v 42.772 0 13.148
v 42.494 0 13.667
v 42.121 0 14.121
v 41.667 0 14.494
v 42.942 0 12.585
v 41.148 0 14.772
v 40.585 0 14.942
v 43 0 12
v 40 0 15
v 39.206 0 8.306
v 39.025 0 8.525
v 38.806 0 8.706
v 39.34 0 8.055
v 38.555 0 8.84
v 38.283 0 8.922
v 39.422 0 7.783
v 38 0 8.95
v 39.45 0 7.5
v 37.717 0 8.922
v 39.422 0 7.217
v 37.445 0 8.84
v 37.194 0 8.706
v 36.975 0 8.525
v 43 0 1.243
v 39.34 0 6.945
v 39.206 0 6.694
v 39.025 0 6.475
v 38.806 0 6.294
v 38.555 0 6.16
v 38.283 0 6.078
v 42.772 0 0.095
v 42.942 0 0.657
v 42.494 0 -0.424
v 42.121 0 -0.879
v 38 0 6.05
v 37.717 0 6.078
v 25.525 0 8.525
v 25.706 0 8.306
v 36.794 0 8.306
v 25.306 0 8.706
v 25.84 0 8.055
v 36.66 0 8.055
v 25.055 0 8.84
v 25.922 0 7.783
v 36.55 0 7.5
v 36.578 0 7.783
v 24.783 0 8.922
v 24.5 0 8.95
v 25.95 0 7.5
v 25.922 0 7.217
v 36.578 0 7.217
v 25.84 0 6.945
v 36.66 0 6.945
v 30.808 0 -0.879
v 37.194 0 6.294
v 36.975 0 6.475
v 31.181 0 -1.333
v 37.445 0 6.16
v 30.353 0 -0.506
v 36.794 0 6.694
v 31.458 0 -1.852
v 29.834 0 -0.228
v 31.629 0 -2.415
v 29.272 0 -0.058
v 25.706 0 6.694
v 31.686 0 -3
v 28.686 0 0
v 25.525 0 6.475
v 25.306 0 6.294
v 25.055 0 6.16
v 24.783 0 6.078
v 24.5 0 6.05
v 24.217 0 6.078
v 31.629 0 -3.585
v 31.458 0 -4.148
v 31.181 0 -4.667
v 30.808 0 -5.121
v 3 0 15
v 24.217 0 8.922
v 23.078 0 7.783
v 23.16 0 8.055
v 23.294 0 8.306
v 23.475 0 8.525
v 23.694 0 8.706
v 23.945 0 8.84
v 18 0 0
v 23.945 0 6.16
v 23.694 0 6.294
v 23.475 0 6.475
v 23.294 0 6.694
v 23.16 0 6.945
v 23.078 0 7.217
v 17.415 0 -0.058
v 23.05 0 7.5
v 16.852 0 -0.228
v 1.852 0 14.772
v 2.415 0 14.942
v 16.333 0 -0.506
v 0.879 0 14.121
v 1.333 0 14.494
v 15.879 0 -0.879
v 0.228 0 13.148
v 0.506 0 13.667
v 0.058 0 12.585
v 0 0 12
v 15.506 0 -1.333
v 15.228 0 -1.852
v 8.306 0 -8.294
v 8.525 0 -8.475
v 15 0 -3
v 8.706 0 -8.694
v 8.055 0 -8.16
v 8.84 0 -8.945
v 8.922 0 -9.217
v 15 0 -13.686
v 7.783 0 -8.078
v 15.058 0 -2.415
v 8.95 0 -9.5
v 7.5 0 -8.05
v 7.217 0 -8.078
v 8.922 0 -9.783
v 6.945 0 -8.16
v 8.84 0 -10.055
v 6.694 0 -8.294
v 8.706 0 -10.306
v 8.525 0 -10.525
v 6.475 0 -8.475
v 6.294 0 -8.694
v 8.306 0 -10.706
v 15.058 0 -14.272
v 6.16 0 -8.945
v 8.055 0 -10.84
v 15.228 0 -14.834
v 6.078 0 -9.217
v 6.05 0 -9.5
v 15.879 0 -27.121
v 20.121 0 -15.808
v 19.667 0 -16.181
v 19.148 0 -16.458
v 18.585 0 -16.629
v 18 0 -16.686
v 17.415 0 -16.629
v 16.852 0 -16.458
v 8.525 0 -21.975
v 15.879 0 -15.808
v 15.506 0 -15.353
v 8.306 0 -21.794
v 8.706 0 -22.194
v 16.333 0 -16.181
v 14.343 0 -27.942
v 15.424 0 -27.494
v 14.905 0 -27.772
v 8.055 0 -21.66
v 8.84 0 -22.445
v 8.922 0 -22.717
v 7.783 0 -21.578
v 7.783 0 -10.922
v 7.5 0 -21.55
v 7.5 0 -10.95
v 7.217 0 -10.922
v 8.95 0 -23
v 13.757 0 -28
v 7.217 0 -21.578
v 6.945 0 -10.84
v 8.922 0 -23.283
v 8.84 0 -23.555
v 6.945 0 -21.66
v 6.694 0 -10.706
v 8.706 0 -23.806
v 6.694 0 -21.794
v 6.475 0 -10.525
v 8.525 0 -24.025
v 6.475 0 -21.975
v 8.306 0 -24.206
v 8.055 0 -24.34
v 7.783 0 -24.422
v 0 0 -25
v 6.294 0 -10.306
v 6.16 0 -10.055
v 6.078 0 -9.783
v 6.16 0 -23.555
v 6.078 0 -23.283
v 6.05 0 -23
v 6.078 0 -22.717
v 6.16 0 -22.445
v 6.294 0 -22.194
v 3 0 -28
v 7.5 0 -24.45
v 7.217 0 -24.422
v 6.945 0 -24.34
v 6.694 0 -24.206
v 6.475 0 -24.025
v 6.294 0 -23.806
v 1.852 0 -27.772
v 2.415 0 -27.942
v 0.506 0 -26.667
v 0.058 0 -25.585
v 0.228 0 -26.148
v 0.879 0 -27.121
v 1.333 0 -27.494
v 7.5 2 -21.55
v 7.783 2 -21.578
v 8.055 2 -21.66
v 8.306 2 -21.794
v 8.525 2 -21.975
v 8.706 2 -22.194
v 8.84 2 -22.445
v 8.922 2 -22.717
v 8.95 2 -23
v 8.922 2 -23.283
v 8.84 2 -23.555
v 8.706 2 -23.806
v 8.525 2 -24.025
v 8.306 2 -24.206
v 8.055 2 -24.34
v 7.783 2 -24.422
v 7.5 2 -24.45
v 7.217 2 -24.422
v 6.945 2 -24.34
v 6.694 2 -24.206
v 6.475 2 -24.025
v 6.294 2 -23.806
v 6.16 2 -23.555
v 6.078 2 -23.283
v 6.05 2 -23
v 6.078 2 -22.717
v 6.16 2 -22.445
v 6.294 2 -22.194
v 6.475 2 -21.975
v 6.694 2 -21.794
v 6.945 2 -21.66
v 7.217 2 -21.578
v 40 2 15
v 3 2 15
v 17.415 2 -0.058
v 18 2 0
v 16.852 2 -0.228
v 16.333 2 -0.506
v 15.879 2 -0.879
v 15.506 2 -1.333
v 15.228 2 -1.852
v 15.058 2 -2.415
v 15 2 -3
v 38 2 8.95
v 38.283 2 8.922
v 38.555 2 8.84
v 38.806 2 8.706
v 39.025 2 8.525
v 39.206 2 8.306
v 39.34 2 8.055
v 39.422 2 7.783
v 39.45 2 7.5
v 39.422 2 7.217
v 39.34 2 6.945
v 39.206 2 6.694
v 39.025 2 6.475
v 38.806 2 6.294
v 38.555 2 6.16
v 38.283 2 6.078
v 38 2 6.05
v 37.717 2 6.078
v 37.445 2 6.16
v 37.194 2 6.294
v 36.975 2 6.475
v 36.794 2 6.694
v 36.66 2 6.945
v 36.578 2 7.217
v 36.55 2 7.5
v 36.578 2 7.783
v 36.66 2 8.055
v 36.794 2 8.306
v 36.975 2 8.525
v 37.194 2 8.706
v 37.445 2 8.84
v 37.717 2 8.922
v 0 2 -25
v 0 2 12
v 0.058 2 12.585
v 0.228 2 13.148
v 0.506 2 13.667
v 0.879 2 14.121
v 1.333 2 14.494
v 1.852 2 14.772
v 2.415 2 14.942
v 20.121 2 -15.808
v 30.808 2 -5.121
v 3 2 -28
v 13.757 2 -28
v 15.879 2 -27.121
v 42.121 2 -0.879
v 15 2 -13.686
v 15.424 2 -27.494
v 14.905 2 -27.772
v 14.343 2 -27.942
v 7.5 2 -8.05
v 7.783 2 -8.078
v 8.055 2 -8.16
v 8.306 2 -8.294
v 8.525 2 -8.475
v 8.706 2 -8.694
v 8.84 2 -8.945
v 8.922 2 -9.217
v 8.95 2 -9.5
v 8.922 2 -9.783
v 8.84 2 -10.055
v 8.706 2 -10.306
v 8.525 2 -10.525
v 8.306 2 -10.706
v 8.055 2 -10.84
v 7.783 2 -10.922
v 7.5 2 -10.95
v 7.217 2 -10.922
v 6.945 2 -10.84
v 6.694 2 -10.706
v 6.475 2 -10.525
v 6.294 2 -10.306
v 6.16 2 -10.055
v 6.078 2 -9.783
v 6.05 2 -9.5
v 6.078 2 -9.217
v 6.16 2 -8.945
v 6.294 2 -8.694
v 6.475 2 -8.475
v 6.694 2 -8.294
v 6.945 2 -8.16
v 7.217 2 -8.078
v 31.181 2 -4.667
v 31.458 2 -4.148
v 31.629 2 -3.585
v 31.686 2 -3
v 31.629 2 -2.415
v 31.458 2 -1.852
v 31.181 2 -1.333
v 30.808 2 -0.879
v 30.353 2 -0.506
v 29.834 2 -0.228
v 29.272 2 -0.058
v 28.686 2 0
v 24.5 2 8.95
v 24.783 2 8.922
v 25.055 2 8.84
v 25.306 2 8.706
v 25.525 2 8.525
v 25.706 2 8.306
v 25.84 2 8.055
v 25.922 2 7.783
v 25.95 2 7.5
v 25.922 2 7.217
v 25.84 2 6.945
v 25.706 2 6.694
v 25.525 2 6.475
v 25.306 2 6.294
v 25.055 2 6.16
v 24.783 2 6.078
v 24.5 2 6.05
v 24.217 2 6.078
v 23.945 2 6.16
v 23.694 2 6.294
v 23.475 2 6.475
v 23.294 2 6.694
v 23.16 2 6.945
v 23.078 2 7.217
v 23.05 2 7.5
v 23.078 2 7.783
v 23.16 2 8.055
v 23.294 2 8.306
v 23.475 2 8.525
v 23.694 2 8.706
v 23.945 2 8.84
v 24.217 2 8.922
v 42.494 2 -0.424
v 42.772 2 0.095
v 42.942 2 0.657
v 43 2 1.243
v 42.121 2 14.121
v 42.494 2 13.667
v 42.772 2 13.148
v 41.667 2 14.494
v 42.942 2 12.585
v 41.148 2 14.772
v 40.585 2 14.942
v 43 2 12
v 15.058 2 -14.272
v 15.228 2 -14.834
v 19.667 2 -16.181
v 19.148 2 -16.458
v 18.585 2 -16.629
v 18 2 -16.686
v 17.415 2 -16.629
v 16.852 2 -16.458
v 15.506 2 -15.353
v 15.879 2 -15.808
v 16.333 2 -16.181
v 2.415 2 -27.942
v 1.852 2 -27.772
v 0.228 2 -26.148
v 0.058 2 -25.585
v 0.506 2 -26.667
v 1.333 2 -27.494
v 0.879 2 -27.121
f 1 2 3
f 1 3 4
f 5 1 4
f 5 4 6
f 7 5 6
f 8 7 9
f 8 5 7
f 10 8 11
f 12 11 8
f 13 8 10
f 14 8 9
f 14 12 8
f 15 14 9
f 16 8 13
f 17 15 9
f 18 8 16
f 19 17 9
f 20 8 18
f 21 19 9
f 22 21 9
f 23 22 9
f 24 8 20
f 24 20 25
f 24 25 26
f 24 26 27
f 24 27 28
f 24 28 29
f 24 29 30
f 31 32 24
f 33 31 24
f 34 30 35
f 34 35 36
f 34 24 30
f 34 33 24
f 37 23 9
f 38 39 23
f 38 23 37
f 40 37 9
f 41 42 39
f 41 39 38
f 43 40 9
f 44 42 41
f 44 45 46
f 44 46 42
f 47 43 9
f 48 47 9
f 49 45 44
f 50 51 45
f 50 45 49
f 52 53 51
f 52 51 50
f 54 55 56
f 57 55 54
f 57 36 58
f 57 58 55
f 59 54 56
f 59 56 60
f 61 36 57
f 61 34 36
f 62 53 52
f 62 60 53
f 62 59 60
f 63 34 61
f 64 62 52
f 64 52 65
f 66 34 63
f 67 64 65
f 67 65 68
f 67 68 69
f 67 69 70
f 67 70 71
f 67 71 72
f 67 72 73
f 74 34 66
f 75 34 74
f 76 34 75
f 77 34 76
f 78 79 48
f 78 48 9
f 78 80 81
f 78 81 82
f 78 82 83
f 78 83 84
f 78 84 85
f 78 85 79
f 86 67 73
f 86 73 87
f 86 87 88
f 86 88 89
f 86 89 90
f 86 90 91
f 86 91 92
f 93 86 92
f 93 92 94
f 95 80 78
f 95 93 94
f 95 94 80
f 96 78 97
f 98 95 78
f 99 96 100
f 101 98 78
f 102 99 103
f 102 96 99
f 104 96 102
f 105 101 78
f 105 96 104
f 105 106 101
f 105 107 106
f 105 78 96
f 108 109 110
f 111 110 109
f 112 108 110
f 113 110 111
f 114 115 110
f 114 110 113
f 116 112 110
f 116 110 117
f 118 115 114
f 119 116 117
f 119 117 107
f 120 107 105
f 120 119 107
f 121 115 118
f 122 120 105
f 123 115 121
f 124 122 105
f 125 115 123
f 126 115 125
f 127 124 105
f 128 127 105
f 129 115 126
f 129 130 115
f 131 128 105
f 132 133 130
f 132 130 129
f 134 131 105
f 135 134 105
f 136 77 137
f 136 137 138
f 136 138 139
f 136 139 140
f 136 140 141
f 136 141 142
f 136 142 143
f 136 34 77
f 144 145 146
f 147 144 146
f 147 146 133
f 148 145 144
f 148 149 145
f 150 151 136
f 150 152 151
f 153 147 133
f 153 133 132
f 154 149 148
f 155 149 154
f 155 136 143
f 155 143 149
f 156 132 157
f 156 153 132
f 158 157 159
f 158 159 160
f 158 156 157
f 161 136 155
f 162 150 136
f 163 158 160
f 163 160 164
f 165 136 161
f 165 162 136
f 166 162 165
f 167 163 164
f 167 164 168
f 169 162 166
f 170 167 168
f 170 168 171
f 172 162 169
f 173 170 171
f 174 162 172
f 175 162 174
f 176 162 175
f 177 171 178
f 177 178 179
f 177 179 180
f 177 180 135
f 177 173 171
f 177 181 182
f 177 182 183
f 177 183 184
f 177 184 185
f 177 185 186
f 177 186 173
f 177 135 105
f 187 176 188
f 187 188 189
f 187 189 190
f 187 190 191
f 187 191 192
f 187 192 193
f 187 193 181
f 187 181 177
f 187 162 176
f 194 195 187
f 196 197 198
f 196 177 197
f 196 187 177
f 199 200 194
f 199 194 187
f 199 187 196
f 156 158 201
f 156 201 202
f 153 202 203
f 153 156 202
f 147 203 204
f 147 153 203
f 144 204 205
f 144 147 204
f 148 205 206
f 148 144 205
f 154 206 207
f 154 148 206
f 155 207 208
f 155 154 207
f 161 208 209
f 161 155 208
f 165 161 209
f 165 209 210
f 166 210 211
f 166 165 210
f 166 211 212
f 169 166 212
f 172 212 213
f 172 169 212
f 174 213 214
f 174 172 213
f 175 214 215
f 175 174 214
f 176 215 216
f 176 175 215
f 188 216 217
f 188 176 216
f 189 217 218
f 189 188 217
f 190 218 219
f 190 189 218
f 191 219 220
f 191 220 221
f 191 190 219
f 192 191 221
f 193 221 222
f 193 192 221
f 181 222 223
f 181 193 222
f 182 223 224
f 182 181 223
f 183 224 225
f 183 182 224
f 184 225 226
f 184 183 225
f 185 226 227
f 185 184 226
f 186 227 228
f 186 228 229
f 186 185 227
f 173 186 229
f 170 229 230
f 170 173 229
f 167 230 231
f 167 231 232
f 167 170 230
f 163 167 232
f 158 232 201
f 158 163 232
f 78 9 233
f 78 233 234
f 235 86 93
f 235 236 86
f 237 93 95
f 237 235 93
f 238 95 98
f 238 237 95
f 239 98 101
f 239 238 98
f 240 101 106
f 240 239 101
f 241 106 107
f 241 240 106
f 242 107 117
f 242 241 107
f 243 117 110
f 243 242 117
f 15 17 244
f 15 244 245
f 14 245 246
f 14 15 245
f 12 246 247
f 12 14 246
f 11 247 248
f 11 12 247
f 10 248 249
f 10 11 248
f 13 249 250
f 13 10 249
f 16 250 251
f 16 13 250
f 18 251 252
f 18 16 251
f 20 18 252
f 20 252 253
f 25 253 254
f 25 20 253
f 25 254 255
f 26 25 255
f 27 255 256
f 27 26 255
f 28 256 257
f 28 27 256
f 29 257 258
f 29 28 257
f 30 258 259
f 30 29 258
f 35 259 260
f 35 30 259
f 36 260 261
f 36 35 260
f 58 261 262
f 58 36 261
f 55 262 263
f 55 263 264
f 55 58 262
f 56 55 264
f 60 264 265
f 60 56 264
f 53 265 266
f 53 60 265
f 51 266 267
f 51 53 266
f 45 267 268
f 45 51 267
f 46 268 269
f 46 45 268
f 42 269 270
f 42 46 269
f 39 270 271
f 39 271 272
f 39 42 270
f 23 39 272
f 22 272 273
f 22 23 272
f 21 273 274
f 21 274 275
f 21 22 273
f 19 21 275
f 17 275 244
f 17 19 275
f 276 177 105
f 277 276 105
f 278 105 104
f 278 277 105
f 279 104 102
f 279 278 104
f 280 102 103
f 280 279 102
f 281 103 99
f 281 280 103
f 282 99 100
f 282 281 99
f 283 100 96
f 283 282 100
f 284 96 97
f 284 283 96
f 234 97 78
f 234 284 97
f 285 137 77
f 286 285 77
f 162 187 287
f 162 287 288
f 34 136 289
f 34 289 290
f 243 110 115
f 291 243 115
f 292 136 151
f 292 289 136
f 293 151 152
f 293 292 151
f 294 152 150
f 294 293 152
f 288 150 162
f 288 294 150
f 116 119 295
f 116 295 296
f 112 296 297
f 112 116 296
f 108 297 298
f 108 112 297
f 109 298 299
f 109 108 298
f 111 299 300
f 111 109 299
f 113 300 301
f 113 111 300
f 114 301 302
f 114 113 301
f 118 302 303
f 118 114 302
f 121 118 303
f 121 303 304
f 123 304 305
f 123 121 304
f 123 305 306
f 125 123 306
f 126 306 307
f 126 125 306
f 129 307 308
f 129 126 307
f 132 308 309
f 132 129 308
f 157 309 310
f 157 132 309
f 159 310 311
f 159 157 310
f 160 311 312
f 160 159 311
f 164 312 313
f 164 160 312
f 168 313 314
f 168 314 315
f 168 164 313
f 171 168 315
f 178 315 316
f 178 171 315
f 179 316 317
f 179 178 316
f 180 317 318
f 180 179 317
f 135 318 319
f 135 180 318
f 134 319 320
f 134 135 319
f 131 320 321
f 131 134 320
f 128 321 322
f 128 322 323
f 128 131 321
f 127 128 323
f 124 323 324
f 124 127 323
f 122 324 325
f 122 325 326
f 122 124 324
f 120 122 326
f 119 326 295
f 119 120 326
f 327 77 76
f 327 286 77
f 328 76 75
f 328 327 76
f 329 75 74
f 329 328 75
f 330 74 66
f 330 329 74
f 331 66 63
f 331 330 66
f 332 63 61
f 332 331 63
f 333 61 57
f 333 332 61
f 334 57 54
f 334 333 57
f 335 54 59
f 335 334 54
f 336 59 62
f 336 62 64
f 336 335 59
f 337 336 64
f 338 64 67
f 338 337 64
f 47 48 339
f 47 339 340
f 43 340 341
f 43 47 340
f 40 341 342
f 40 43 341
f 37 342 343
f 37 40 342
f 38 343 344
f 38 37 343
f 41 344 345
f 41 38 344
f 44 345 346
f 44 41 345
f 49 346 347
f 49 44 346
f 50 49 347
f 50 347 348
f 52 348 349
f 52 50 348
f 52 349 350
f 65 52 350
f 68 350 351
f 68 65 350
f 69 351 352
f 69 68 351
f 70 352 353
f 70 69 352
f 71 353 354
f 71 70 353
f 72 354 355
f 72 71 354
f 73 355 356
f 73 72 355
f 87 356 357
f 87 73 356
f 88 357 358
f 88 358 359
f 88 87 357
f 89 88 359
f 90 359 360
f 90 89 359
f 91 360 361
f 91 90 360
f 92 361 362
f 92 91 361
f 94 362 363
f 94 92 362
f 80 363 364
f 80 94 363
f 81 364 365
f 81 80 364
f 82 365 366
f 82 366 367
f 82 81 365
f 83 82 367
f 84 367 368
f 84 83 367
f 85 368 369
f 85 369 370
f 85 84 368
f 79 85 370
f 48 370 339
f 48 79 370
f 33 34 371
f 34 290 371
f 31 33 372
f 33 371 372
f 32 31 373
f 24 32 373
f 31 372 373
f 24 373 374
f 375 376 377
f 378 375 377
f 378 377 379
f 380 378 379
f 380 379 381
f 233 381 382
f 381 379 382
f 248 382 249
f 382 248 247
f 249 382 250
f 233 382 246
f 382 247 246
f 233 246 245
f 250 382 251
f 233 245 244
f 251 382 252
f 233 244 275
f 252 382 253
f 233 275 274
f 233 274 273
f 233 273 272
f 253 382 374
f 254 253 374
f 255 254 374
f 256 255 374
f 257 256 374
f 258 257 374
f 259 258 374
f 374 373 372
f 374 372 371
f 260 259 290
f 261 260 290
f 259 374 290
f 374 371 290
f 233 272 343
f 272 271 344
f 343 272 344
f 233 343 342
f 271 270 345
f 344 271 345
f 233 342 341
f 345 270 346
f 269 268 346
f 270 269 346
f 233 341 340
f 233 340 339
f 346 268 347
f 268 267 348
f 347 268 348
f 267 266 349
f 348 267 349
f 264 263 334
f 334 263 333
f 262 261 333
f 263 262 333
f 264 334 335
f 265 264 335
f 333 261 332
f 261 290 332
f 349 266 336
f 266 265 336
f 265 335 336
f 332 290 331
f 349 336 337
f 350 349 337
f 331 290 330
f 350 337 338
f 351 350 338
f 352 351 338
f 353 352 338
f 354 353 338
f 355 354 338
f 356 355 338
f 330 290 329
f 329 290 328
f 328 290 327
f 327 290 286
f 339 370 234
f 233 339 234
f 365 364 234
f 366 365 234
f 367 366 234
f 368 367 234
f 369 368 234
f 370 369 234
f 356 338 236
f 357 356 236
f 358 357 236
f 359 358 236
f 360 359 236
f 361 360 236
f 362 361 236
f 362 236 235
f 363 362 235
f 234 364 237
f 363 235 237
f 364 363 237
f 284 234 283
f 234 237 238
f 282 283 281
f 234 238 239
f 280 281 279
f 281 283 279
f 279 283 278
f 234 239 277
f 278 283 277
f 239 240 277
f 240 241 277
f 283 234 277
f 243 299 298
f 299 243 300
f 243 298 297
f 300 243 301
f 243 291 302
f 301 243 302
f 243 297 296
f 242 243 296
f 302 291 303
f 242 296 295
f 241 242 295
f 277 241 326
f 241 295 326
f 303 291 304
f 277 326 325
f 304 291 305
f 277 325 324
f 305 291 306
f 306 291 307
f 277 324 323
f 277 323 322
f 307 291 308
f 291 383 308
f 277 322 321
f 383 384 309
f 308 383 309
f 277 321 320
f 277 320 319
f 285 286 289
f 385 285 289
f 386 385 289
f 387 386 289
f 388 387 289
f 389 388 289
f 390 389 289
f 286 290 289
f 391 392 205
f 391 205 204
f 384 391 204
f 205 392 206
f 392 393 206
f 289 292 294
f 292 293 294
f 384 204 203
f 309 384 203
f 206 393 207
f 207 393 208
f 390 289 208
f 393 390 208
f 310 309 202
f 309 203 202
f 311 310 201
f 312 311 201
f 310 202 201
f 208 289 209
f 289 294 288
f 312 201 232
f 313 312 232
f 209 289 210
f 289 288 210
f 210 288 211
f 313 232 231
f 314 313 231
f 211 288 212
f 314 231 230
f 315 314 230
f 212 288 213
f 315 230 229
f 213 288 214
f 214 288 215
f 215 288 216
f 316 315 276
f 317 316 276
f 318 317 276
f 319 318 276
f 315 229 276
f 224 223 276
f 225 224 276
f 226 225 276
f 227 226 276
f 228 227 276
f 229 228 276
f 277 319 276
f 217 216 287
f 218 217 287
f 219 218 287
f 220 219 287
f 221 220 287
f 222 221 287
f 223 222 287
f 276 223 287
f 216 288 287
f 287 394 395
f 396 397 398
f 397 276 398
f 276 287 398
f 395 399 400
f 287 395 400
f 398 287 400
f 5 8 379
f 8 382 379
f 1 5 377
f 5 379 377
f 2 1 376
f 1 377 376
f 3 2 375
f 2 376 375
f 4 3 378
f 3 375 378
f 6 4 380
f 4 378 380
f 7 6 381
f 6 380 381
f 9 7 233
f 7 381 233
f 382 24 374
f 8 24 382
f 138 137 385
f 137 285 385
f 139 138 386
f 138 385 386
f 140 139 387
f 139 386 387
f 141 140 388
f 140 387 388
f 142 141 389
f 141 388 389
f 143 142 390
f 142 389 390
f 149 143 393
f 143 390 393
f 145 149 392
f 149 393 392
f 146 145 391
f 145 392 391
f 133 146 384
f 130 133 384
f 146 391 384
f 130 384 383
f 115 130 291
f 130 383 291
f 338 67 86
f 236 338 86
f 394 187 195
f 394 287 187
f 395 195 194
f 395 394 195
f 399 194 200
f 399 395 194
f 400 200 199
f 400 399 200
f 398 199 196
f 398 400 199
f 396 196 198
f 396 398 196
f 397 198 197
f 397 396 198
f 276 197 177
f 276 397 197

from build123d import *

# Parameters (mm, degrees)
SKETCH_1_R      = 1.45
EXTRUDE_1_DEPTH = 2
FILLET_2_R      = 3


with BuildPart() as part:
    # 草图1 → 凸台-拉伸1 (new body)
    with BuildSketch(Plane(origin=(0, 0, 0), x_dir=(1, 0, 0), z_dir=(0, 1, 0))):
        Polygon((15, 28), (43, 0), (43, -15), (0, -15), (0, 0), (0, 28), align=None)
        with Locations(Location((24.5, -7.5, 0), (0, 0, 270))):
            Circle(SKETCH_1_R, mode=Mode.SUBTRACT)
        with Locations(Location((7.5, 9.5, 0), (0, 0, 270))):
            Circle(SKETCH_1_R, mode=Mode.SUBTRACT)
        with Locations(Location((38, -7.5, 0), (0, 0, 270))):
            Circle(SKETCH_1_R, mode=Mode.SUBTRACT)
        with Locations(Location((7.5, 23, 0), (0, 0, 270))):
            Circle(SKETCH_1_R, mode=Mode.SUBTRACT)
        Polygon((15, 20.928932188), (35.928932188, 0), (15, 0), align=None, mode=Mode.SUBTRACT)
    extrude(amount=EXTRUDE_1_DEPTH)

    # 圆角2
    fillet_2_edges = [part.edges().sort_by_distance(p)[0] for p in [
        (0, 1, -28),
        (15, 1, -28),
        (43, 1, 0),
        (43, 1, 15),
        (0, 1, 15),
        (15, 1, -20.928932188),
        (15, 1, 0),
        (35.928932188, 1, 0),
    ]]
    fillet(fillet_2_edges, radius=FILLET_2_R)


solid = part.part
